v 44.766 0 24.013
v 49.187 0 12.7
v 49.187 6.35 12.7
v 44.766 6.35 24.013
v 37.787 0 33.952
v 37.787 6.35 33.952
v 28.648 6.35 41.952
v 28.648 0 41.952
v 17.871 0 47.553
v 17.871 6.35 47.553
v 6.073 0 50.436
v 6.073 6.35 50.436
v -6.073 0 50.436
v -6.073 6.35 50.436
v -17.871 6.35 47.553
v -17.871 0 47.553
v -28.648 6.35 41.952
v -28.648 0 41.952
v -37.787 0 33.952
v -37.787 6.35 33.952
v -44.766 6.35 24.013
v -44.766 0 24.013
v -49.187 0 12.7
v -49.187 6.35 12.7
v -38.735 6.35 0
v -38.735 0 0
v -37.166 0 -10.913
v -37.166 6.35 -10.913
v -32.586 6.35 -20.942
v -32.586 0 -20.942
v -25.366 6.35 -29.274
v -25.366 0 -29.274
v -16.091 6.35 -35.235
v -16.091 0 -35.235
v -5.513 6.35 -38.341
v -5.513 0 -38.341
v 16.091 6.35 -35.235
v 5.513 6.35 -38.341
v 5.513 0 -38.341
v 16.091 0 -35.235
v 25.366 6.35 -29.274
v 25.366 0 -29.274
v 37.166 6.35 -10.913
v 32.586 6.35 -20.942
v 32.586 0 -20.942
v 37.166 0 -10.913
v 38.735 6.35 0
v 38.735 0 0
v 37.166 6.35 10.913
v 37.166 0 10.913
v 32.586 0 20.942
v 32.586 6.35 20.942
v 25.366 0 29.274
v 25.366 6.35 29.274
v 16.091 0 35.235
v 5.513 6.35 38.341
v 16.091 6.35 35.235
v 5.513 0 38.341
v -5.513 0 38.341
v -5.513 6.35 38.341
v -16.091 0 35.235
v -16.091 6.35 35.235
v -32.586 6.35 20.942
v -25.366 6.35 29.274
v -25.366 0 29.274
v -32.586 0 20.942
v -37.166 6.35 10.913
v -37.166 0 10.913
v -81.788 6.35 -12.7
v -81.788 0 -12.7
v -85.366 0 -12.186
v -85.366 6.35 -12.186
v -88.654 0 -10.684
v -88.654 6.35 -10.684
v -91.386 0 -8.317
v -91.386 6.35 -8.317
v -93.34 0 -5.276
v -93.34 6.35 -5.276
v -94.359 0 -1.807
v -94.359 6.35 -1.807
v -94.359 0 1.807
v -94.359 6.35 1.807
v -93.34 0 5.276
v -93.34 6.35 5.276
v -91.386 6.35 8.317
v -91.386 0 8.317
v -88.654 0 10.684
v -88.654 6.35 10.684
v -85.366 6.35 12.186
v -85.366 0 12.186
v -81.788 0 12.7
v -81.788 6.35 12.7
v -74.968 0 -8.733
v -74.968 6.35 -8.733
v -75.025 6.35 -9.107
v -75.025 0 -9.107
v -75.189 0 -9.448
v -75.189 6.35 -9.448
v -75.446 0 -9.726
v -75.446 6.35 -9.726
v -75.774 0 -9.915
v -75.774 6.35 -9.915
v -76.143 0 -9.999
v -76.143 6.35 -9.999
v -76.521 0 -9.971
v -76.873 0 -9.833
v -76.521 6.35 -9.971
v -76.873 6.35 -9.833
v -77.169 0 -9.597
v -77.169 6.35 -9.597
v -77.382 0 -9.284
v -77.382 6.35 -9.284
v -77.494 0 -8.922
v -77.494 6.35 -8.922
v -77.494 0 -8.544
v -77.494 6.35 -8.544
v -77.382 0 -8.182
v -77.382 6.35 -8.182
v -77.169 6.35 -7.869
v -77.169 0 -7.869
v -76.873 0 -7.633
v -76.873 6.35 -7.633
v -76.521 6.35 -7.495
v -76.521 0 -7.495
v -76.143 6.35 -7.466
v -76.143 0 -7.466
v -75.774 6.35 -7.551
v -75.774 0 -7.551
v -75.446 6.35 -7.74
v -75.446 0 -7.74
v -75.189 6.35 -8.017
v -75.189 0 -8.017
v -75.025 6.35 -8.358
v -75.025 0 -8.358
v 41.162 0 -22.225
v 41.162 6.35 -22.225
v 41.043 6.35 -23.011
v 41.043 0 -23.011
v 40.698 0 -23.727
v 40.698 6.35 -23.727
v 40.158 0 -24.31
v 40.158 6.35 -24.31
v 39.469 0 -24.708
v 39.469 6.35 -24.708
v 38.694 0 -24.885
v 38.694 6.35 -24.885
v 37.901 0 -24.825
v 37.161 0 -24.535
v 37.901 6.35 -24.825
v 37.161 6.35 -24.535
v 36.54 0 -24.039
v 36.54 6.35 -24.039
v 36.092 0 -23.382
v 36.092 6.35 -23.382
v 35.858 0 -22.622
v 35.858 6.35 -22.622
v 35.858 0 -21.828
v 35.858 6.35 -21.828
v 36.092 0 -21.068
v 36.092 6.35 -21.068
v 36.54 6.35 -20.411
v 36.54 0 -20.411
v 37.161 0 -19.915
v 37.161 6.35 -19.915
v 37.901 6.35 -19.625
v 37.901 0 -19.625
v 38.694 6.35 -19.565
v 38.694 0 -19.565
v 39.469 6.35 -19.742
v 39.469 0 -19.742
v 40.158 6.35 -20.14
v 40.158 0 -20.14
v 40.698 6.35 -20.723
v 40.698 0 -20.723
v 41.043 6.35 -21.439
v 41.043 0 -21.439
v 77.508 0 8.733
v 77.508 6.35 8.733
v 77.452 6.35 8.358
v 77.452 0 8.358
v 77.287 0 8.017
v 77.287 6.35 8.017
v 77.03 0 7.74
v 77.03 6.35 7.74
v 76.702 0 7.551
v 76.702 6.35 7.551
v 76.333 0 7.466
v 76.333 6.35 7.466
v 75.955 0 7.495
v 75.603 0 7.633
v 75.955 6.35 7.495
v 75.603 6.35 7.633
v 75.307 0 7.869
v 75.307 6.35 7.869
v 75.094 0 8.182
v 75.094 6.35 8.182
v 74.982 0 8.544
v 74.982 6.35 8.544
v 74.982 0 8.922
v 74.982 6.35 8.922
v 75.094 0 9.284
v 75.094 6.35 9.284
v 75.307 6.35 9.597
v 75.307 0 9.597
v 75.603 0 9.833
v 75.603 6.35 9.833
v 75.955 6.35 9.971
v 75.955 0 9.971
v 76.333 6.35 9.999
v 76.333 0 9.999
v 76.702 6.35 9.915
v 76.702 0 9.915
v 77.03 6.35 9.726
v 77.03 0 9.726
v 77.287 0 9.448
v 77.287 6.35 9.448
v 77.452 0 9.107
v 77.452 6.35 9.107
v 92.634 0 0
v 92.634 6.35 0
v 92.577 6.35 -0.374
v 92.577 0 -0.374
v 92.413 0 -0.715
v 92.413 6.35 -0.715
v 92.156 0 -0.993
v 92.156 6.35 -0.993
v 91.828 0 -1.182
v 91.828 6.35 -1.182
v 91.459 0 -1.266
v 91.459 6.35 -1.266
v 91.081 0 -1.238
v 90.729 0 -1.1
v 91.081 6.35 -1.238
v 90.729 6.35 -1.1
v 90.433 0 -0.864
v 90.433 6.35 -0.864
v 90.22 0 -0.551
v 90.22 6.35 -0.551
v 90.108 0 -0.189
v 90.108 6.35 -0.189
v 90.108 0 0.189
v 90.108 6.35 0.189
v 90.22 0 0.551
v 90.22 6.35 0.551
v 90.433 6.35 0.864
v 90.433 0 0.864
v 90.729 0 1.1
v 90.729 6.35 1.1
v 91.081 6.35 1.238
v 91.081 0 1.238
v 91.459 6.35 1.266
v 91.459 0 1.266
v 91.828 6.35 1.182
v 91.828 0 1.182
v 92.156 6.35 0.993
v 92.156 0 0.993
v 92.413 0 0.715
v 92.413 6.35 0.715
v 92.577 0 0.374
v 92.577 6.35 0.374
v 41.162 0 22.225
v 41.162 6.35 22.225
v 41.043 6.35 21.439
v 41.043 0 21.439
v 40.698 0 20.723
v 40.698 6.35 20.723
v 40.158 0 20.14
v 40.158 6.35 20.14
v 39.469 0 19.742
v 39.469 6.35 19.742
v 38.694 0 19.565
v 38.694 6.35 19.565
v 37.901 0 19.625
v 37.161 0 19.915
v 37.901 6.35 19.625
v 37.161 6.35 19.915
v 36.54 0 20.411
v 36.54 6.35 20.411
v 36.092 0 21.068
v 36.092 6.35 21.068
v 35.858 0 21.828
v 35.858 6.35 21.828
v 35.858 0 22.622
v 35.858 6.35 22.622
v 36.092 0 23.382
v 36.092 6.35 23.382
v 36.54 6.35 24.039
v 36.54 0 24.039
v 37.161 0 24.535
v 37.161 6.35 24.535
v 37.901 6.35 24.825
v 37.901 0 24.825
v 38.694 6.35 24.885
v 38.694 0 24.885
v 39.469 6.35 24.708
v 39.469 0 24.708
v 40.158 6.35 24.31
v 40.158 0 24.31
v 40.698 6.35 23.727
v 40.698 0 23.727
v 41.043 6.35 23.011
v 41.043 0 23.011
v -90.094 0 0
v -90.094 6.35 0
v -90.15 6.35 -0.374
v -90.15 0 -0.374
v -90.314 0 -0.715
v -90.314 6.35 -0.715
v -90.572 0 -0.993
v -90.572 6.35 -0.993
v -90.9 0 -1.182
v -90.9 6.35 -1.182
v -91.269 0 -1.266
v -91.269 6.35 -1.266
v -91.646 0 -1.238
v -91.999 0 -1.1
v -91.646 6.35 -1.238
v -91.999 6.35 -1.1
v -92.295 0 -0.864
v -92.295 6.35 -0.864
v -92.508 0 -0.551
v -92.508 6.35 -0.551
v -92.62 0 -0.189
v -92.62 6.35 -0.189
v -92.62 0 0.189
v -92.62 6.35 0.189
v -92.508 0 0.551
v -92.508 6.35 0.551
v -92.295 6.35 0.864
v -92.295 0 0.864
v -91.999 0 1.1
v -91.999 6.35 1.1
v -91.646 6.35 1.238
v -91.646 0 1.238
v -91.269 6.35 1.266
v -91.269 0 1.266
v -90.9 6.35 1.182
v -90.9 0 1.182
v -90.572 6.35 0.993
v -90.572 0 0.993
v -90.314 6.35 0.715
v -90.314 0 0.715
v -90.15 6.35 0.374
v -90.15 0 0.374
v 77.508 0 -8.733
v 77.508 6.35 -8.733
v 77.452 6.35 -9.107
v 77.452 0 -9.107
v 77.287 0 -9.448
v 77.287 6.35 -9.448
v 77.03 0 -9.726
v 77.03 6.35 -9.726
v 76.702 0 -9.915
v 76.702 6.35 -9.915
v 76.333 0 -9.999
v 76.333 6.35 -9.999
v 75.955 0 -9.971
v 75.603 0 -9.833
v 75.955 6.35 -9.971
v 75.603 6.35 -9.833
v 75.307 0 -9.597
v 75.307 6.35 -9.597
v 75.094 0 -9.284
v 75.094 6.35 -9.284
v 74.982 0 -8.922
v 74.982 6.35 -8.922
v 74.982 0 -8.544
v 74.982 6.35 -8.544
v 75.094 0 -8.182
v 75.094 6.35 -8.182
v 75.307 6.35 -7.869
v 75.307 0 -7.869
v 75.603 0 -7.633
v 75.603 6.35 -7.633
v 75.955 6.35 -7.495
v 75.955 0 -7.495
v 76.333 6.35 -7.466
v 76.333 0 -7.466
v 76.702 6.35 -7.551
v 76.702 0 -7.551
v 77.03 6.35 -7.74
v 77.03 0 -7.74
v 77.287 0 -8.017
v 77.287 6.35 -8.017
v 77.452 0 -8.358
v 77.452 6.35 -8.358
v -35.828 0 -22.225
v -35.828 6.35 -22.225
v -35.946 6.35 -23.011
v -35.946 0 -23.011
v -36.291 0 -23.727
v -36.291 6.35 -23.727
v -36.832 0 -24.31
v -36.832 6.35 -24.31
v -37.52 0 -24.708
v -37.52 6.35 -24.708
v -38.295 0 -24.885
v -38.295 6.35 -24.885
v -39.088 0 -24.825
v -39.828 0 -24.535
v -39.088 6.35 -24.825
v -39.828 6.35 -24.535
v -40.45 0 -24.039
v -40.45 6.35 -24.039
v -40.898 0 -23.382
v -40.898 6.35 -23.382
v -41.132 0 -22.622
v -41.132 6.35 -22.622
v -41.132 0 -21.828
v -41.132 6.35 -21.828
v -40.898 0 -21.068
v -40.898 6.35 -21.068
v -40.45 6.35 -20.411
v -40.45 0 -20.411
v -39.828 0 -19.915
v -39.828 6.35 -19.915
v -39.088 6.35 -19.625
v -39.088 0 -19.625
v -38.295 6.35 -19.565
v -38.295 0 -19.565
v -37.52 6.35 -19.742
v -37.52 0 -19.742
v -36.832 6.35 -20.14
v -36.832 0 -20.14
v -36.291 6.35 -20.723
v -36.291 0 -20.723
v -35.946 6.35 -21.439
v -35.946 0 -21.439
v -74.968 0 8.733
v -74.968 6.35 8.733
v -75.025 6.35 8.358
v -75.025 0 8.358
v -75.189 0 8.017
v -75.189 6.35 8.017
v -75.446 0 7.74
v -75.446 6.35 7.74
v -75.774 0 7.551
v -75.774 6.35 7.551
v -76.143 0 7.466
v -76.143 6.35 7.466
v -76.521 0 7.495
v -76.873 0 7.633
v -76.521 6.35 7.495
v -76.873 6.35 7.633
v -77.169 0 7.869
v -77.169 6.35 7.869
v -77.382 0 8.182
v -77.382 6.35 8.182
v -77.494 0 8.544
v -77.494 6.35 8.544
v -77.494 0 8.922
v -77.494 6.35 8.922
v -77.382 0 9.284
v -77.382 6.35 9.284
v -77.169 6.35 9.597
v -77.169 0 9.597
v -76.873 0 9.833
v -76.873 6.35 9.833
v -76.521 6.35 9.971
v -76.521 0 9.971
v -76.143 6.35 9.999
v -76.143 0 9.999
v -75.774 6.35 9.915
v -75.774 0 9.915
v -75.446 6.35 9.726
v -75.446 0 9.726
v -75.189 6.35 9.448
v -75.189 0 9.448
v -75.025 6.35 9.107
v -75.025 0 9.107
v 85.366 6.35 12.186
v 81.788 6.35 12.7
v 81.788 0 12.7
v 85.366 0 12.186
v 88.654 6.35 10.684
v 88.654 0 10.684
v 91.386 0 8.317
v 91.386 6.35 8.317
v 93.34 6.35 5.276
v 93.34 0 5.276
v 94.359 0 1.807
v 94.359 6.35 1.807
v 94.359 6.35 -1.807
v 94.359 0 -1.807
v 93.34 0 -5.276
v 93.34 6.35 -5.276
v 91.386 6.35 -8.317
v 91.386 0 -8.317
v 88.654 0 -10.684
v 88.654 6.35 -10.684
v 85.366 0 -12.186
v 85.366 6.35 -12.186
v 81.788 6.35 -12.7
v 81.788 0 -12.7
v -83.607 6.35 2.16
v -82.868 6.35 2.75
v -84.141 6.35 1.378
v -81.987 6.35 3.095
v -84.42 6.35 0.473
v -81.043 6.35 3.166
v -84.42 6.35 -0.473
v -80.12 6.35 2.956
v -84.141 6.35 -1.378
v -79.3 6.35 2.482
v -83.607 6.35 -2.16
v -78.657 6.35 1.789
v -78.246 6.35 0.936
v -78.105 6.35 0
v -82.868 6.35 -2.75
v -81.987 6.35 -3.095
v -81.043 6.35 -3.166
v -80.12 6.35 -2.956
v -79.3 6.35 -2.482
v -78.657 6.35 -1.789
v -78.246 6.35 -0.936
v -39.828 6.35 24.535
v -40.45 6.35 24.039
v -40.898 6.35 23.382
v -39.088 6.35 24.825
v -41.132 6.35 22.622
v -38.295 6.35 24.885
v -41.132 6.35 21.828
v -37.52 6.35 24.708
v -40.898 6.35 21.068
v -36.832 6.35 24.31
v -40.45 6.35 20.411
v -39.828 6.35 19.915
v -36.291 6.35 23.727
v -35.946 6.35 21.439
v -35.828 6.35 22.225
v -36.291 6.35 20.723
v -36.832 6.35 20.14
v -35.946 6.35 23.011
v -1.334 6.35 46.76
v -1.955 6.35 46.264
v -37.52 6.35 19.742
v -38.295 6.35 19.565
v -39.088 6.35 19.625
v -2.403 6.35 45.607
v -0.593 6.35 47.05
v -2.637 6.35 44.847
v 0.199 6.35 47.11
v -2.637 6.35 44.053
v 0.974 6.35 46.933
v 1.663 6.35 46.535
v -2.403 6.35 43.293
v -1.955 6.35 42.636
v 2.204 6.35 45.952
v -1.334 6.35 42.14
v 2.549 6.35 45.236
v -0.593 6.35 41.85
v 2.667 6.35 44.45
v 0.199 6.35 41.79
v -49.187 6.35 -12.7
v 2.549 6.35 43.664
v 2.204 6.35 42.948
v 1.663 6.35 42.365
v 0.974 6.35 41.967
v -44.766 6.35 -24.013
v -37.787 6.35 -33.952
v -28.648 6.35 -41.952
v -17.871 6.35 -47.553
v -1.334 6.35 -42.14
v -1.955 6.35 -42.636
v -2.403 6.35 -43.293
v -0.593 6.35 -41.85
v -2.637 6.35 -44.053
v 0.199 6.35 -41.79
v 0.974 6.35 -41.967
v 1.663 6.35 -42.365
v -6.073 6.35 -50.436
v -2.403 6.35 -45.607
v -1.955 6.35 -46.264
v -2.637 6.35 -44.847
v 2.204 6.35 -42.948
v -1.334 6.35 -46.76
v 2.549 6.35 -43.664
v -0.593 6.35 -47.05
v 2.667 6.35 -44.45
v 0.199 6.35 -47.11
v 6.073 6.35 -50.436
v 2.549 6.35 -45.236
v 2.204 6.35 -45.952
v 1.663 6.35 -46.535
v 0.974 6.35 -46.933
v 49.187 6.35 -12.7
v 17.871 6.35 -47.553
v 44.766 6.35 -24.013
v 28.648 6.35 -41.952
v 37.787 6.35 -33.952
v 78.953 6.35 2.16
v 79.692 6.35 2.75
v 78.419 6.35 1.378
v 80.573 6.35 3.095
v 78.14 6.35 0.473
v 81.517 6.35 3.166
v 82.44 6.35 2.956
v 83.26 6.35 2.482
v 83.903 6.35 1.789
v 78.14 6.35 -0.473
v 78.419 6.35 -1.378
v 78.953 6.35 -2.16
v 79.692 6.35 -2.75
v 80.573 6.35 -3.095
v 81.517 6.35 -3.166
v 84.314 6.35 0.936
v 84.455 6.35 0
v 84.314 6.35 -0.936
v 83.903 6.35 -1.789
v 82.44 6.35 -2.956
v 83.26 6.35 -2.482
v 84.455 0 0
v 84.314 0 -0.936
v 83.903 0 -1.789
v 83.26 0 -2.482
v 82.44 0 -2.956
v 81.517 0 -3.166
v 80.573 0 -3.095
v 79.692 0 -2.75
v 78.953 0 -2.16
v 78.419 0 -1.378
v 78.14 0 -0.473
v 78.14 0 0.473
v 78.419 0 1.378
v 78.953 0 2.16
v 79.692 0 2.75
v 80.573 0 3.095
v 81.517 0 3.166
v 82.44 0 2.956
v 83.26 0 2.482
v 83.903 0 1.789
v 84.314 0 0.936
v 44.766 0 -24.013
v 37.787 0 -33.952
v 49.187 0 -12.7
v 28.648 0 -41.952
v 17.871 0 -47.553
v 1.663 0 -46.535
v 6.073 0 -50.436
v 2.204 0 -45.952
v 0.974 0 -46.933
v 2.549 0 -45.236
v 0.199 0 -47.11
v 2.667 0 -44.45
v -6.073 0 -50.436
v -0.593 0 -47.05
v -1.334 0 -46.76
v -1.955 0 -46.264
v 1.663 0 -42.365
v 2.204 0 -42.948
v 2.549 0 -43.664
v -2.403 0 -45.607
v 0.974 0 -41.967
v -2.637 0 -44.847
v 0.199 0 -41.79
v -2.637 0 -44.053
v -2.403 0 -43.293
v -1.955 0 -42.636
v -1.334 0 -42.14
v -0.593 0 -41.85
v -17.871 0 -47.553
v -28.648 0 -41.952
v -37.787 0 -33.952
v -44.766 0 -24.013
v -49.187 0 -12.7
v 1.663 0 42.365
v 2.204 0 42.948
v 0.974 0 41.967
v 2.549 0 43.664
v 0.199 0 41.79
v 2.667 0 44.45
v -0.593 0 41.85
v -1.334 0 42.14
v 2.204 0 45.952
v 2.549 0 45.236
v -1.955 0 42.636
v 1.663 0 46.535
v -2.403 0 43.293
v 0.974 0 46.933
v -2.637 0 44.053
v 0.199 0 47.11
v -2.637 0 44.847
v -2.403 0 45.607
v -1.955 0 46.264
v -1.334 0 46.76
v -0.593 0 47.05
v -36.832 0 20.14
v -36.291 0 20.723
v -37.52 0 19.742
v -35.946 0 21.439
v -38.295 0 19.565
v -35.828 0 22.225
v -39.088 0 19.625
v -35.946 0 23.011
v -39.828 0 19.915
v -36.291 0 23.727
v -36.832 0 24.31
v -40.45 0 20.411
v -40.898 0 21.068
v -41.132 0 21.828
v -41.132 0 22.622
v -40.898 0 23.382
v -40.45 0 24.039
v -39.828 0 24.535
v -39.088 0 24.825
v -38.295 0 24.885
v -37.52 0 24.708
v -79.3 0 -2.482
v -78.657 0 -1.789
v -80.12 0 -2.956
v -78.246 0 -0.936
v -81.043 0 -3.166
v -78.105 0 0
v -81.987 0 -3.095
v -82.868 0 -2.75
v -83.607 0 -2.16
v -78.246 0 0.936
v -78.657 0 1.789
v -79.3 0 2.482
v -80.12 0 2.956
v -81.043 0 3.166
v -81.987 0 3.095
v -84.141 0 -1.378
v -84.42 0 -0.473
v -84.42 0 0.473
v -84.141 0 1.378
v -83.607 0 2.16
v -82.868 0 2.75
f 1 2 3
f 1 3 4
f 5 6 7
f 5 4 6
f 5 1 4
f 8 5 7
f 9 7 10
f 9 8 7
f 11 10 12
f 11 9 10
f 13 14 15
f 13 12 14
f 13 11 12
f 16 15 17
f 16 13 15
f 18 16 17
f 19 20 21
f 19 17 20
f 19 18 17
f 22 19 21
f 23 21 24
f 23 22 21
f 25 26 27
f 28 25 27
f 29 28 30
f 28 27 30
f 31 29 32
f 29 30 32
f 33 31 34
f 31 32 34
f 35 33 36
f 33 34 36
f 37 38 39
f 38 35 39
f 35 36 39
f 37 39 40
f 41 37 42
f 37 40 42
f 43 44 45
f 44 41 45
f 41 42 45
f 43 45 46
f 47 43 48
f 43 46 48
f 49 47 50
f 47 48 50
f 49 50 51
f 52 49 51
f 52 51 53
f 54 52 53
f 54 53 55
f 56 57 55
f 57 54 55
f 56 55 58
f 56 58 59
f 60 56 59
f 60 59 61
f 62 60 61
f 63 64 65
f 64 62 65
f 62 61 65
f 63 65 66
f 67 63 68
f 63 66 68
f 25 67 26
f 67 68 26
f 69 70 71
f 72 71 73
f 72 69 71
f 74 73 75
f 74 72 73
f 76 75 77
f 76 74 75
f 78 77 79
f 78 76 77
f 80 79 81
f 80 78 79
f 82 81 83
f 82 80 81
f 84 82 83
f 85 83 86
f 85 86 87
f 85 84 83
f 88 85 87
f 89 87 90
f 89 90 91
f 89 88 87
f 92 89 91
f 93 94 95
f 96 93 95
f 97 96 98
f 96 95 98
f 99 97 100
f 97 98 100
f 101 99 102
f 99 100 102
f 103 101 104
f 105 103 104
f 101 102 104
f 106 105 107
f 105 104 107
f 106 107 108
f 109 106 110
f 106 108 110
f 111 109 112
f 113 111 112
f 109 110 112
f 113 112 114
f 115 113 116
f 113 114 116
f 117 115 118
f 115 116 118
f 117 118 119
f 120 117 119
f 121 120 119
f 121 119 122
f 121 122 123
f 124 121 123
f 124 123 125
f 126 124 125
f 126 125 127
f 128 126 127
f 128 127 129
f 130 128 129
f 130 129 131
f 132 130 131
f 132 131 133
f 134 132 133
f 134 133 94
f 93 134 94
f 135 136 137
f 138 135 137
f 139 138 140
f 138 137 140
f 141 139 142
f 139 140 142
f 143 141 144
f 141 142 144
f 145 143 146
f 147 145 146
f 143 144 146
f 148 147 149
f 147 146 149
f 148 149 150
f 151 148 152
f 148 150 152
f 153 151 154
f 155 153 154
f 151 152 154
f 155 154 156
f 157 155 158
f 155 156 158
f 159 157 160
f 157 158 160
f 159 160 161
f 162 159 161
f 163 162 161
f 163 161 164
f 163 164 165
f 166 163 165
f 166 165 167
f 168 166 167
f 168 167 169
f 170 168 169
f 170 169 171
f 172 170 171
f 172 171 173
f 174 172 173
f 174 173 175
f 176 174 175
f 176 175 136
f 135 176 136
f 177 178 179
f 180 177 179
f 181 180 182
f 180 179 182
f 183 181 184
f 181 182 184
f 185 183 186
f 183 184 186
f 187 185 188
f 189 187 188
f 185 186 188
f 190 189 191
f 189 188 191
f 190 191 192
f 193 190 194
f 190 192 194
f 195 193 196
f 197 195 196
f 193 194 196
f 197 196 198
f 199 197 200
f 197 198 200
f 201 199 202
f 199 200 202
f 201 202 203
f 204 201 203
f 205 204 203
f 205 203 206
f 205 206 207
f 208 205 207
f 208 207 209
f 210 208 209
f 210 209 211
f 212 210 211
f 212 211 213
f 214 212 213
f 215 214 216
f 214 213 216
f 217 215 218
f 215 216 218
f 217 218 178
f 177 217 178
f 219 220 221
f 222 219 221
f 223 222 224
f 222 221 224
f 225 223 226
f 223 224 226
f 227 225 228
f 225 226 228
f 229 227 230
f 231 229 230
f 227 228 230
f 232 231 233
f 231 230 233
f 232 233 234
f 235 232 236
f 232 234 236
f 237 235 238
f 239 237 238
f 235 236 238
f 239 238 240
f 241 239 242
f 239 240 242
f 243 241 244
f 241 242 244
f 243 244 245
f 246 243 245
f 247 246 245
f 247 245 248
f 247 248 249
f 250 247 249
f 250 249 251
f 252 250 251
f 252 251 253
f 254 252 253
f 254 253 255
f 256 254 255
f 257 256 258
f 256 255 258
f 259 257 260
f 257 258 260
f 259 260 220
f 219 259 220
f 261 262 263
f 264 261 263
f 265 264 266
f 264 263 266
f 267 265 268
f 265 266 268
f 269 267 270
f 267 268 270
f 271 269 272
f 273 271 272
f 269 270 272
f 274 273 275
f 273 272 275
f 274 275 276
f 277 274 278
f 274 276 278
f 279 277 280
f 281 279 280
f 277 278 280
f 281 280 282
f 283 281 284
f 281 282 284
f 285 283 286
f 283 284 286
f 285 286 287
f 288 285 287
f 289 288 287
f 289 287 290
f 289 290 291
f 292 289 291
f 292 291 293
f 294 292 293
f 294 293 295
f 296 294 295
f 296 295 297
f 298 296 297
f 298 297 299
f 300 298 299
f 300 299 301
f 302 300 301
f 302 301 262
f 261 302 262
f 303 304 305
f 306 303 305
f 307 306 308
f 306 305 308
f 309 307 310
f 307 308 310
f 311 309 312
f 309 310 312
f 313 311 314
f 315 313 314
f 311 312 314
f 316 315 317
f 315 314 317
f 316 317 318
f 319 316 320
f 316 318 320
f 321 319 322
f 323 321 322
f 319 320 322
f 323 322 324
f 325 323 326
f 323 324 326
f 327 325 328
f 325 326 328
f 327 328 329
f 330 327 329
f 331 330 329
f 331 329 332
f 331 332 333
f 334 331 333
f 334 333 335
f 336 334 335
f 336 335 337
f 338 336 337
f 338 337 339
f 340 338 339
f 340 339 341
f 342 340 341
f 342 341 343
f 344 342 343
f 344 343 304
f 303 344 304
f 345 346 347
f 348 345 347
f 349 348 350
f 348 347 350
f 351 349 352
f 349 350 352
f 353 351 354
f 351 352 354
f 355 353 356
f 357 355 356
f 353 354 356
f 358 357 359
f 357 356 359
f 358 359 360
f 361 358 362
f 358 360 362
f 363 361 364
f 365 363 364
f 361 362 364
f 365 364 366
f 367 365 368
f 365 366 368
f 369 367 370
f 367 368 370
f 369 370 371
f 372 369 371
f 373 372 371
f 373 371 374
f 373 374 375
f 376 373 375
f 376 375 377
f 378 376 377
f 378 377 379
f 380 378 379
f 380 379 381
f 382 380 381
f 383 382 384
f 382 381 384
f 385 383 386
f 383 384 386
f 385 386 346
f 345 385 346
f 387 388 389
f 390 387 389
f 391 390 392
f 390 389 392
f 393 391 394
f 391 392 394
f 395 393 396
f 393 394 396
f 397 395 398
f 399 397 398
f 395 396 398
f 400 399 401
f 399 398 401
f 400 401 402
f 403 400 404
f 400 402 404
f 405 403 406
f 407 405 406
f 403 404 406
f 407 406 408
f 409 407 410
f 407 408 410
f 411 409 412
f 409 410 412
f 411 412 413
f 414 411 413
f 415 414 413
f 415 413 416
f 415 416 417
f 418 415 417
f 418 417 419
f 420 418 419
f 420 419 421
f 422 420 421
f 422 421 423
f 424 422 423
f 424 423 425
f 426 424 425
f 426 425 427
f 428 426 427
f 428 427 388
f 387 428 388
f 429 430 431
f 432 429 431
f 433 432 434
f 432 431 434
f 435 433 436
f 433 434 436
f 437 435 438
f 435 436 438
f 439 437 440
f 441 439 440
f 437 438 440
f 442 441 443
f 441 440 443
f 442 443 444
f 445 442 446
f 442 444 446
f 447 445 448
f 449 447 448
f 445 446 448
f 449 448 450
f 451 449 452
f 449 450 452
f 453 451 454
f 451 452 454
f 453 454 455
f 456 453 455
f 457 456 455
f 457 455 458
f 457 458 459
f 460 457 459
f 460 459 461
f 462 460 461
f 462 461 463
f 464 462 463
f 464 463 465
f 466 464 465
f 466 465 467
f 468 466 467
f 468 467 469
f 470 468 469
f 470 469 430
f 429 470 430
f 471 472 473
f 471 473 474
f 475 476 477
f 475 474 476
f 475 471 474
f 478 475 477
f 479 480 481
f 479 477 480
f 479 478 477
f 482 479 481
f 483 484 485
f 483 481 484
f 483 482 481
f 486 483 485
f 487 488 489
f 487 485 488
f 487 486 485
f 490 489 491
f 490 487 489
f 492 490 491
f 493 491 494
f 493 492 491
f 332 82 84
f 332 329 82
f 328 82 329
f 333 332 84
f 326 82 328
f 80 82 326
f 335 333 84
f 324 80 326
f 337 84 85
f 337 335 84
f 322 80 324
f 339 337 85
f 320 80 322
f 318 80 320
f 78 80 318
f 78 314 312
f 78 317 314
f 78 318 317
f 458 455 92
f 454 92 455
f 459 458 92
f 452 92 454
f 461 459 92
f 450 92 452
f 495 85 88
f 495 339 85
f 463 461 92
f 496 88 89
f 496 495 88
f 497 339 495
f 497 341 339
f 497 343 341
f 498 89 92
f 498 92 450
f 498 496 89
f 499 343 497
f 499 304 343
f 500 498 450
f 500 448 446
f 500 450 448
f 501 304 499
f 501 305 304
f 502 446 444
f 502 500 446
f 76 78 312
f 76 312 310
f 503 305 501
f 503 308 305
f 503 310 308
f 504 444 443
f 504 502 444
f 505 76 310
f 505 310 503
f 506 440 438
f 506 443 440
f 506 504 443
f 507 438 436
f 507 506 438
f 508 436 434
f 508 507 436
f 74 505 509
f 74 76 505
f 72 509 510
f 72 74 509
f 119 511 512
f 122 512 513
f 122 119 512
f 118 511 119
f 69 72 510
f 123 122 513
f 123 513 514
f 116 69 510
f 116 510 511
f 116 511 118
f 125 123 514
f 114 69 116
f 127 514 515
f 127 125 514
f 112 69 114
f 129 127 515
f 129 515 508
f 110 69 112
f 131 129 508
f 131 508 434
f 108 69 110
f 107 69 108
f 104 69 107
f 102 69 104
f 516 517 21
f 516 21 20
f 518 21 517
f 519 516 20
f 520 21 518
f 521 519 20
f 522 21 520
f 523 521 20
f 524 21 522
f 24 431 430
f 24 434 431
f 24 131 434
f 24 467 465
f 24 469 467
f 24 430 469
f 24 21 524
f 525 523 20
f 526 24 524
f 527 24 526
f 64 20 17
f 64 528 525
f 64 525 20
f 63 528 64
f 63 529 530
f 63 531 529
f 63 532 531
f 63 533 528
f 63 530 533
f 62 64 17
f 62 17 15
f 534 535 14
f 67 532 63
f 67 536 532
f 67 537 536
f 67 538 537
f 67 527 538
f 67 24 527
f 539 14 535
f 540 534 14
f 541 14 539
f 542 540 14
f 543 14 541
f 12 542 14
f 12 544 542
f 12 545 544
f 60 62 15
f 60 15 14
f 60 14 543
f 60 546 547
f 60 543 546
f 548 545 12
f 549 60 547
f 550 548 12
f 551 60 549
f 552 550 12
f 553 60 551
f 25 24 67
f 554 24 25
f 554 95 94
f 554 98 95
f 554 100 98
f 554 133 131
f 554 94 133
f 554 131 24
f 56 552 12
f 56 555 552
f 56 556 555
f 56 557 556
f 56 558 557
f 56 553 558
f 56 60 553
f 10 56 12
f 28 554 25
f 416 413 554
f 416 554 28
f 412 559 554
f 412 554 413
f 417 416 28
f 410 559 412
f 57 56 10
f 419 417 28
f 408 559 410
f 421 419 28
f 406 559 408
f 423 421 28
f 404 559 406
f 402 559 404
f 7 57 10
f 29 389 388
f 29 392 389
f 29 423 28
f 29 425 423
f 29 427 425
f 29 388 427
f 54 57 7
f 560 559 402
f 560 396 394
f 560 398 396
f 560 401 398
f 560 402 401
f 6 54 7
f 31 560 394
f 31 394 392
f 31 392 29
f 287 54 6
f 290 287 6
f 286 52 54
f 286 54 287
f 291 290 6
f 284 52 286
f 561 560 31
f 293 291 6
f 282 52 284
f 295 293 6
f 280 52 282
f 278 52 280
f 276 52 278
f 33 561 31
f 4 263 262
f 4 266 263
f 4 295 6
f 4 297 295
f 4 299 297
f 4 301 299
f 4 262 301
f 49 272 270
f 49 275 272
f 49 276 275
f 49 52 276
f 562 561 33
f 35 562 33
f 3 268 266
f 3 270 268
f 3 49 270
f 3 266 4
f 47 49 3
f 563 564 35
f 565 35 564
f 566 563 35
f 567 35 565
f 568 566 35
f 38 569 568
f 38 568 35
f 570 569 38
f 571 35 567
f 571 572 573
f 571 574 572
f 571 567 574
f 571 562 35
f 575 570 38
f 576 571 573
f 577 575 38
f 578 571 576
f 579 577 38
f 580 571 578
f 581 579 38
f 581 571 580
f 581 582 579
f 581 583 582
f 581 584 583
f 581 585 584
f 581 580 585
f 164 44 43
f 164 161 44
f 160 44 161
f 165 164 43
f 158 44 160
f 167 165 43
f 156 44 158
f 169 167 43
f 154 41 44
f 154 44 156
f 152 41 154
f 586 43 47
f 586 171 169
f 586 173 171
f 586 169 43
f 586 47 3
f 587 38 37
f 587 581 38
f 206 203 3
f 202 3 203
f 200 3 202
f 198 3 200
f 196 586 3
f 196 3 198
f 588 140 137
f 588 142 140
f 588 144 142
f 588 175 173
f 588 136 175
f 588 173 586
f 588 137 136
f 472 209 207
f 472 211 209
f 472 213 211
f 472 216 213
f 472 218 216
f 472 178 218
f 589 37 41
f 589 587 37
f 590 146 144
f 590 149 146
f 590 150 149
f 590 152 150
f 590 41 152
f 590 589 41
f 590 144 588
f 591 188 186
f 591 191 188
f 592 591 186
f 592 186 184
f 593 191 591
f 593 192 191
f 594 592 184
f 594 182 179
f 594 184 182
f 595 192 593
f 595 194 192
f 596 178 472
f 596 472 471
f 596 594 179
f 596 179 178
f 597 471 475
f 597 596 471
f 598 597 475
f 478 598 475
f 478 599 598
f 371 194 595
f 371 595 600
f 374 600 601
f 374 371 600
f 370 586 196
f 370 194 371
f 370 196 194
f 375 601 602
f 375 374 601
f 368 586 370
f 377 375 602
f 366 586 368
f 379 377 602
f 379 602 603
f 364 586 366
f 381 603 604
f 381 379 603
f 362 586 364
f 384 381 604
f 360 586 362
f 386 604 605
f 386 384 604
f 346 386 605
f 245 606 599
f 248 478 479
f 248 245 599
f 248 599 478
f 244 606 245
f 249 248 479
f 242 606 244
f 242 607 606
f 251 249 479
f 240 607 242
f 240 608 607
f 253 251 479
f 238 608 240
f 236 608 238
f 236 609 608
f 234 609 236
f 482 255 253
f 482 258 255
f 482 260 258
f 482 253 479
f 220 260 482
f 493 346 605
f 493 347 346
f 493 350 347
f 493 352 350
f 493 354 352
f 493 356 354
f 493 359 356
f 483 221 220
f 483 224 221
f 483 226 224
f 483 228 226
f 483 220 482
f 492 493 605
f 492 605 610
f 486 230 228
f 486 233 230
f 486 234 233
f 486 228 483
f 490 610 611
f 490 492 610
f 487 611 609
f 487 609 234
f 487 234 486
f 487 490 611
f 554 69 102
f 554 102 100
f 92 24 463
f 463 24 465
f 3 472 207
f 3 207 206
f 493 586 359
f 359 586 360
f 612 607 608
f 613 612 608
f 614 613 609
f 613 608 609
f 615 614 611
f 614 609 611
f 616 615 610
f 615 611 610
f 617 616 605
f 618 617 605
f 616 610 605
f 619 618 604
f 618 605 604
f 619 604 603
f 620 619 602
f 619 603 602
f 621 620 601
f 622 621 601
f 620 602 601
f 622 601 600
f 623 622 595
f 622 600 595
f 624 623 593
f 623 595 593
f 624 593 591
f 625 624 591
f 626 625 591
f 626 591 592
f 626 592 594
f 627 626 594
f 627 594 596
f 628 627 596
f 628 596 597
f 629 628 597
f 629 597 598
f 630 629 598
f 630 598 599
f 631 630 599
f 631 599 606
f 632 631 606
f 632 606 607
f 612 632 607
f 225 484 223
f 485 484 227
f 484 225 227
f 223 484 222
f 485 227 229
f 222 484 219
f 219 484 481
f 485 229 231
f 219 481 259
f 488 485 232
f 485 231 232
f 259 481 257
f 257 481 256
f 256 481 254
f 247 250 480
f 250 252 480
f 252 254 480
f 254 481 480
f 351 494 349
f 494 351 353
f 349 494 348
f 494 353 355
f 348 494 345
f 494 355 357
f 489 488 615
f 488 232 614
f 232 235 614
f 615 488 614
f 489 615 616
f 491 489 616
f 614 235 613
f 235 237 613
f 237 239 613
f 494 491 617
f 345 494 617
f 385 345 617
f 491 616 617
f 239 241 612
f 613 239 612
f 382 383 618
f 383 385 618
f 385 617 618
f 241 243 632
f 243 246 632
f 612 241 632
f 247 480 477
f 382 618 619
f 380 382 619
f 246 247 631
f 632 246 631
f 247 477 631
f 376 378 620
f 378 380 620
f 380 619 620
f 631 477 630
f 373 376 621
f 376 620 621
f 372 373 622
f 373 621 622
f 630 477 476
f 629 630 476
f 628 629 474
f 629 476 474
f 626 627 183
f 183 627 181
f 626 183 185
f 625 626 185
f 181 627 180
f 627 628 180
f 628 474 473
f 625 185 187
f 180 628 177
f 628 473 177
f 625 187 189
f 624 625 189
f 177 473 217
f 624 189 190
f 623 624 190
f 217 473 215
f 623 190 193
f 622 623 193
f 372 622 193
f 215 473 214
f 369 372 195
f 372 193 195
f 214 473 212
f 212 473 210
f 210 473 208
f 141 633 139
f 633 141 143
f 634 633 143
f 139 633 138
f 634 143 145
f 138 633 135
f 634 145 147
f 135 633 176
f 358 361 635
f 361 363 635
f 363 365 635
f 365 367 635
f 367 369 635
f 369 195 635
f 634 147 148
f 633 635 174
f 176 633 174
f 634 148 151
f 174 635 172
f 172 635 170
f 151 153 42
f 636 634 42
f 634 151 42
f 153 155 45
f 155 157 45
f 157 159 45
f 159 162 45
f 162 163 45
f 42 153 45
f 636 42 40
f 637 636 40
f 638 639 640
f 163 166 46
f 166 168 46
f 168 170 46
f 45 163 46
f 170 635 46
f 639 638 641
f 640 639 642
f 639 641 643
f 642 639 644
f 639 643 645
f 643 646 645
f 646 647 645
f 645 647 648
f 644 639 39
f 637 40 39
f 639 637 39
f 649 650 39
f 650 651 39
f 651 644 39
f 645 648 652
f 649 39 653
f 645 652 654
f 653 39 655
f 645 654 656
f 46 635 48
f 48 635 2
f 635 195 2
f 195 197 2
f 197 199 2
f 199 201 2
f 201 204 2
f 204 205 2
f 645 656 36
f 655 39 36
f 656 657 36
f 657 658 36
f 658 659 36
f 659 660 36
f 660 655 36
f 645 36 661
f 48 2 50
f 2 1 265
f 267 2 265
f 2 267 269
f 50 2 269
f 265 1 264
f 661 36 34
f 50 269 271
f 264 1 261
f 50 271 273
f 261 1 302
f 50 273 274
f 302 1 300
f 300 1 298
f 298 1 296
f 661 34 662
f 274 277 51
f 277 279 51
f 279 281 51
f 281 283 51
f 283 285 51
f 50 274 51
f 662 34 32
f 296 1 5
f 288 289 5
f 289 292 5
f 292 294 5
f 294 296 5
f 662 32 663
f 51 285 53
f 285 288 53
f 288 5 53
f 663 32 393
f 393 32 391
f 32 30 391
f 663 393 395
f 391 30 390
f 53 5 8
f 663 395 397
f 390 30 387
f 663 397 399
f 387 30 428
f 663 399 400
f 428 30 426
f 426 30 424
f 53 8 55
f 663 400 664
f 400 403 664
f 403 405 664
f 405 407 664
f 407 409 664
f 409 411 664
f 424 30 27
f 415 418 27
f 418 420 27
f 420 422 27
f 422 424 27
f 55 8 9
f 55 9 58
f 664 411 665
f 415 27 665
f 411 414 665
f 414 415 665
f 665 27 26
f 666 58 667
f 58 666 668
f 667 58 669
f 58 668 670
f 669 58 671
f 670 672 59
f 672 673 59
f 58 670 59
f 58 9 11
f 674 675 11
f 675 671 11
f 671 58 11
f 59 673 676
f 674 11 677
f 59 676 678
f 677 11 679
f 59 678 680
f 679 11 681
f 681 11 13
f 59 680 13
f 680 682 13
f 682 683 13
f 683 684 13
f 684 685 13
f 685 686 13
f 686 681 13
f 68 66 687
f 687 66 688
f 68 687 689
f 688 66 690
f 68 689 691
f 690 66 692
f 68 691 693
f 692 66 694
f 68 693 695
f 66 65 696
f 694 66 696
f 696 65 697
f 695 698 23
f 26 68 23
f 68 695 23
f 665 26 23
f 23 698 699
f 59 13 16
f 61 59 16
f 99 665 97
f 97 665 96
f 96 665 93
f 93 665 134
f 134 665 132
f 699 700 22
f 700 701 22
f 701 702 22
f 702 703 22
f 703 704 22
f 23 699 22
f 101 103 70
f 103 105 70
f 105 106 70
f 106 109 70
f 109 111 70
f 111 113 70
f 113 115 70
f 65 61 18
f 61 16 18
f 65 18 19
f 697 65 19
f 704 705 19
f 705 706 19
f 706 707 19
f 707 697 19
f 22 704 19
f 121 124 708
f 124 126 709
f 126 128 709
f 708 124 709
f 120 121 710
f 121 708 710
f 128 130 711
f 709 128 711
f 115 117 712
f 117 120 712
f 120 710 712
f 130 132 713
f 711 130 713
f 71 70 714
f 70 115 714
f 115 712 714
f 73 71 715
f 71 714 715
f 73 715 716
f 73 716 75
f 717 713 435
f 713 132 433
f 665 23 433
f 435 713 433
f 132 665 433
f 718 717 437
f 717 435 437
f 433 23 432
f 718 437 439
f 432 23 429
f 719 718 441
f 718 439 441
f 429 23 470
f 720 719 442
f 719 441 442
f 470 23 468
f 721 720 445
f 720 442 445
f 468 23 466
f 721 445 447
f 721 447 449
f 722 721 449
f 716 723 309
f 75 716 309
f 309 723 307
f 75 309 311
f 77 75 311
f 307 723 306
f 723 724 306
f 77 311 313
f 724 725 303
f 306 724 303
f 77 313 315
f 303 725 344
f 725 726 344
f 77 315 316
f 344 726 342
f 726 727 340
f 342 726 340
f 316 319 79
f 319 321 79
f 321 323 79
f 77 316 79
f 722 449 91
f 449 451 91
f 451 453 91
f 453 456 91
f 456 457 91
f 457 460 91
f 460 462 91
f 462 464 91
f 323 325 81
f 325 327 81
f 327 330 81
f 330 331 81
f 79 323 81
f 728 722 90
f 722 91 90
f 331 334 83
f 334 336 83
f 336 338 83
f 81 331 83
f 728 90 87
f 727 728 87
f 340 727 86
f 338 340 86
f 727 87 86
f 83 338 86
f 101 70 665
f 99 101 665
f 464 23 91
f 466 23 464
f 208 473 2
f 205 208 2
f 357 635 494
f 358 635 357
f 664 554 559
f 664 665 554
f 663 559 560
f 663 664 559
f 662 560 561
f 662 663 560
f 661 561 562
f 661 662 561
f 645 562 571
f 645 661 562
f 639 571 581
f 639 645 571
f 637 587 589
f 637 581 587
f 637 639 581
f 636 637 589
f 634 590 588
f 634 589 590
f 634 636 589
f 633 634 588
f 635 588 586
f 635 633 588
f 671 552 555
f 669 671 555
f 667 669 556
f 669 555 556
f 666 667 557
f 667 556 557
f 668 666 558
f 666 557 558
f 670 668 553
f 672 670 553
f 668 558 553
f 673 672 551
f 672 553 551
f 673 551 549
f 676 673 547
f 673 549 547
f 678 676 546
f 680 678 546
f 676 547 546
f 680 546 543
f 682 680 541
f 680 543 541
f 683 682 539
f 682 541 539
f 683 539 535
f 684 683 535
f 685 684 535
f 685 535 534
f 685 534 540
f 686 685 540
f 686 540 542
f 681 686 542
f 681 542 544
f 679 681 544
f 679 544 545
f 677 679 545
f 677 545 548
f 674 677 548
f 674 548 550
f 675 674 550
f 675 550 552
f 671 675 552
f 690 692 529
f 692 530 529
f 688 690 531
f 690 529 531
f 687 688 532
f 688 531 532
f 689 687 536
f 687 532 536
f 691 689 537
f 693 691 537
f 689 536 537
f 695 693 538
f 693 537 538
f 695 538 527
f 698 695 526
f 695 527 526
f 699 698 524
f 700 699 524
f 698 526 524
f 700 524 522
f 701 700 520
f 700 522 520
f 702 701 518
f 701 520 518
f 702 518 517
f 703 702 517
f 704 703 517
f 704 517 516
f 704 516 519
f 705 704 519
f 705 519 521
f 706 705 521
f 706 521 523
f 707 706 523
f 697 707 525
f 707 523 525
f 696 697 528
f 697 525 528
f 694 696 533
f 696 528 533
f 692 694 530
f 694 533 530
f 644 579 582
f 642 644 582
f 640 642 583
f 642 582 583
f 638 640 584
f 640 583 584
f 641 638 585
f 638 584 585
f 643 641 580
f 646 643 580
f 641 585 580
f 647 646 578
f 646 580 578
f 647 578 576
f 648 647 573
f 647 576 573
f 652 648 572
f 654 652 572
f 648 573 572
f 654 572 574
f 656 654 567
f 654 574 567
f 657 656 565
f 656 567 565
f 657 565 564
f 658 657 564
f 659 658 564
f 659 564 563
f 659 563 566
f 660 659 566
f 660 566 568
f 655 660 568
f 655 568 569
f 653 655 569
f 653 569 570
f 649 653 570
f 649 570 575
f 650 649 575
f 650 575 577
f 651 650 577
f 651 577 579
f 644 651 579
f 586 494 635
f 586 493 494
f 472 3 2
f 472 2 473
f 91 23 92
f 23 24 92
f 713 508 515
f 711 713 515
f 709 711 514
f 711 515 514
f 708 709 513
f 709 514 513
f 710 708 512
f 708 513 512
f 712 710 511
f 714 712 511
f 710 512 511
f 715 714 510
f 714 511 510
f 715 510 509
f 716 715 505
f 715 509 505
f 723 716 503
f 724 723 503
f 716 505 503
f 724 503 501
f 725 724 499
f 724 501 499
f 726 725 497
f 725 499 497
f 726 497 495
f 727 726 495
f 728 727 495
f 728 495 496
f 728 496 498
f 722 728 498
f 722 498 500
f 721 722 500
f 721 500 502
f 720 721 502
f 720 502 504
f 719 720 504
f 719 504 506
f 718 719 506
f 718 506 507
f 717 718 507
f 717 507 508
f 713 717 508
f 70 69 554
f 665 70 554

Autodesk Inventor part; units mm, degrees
ref_plane "YZ Plane" through (0, 0, 0) normal (1, 0, 0) x (0, 1, 0)
ref_plane "XZ Plane" through (0, 0, 0) normal (0, 1, 0) x (-1, 0, 0)
ref_plane "XY Plane" through (0, 0, 0) normal (0, 0, 1) x (1, 0, 0)
sketch "Sketch4" plane through (0, 0, 0) normal (0, 1, 0) x (-1, 0, 0)
  circle A0 centre (0, 0) radius 38.735
  circle A1 centre (0, 0) radius 50.8
  dimension "d9" = 77.47
  dimension "d10" = 101.6
extrude "Extrusion2" add sketch "Sketch4" along normal blind 6.35
sketch "Sketch5" plane through (0, 6.35, 0) normal (0, 1, 0) x (1, 0, 0)
  circle A0 centre (0, -44.45) radius 2.667
  circle A1 centre (38.4948, -22.225) radius 2.667
  circle A2 centre (38.4948, 22.225) radius 2.667
  circle A3 centre (0, 44.45) radius 2.667
  circle A4 centre (-38.4948, 22.225) radius 2.667
  circle A5 centre (-38.4948, -22.225) radius 2.667
  point P0 (0, 0)
  dimension "d13" = 5.334
  dimension "d16" = 360
extrude "Extrusion3" cut sketch "Sketch5" against normal blind 6.35
sketch "Sketch7" plane through (0, 6.35, 0) normal (0, 1, 0) x (1, 0, 0)
  line L0 (50.8, 12.7) -> (81.788, 12.7)
  line L1 (81.788, 12.7) -> (81.788, -12.7)
  line L2 (81.788, -12.7) -> (50.8, -12.7)
  line L3 (50.8, -12.7) -> (50.8, 12.7)
  line L4 (-50.8, 12.7) -> (-81.788, 12.7)
  line L5 (-81.788, 12.7) -> (-81.788, -12.7)
  line L6 (-81.788, -12.7) -> (-50.8, -12.7)
  line L7 (-50.8, -12.7) -> (-50.8, 12.7)
  point P0 (0, 0)
  dimension "d50" = 30.988
  dimension "d51" = 25.4
  dimension "d52" = 30.988
extrude "Extrusion4" add sketch "Sketch7" against normal blind 6.35
sketch "Sketch8" plane through (0, 6.35, 0) normal (0, 1, 0) x (1, 0, 0)
  line L0 (-123.5202, 12.7) -> (-50.8, 12.7) projected
  line L1 (-60.9386, 12.7) -> (-45.3133, 12.7)
  line L2 (-45.3133, 12.7) -> (-45.3133, -12.7)
  line L3 (-45.3133, -12.7) -> (-60.9386, -12.7)
  line L4 (-60.9386, -12.7) -> (-60.9386, 12.7)
  line L5 (57.1886, 12.7) -> (43.7508, 12.7)
  line L6 (43.7508, 12.7) -> (43.7508, -12.7)
  line L7 (43.7508, -12.7) -> (57.1886, -12.7)
  line L8 (57.1886, -12.7) -> (57.1886, 12.7)
  point P0 (0, 0)
extrude "Extrusion5" add sketch "Sketch8" against normal blind 6.35
sketch "Sketch9" plane through (0, 6.35, 0) normal (0, 1, 0) x (1, 0, 0)
  line L0 (111.76, 12.7) -> (111.76, -12.7) projected
  line L1 (81.788, 12.7) -> (81.788, -12.7) projected
  circle A0 centre (81.788, 0) radius 12.7
  line L2 (-81.788, 12.7) -> (-81.788, -12.7) projected
  circle A1 centre (-81.788, 0) radius 12.7
  point P0 (0, 0)
  point P1 (-111.7602, 0)
  point P2 (-111.76, -12.7)
extrude "Extrusion6" add sketch "Sketch9" against normal blind 6.35
sketch "Sketch10" plane through (0, 6.35, 0) normal (0, 1, 0) x (1, 0, 0)
  circle A0 centre (81.28, 0) radius 3.175
  circle A1 centre (91.3638, 0) radius 1.27
  circle A2 centre (76.2381, 8.7328) radius 1.27
  circle A3 centre (76.2381, -8.7328) radius 1.27
  circle A4 centre (-81.28, 0) radius 3.175
  circle A5 centre (-91.3638, 0) radius 1.27
  circle A6 centre (-76.2381, -8.7328) radius 1.27
  circle A7 centre (-76.2381, 8.7328) radius 1.27
  point P0 (0, 0)
  dimension "d53" = 6.35
  dimension "d54" = 2.54
  dimension "d57" = 360
  dimension "d59" = 6.35
  dimension "d60" = 2.54
  dimension "d63" = 360
extrude "Extrusion7" cut sketch "Sketch10" against normal blind 6.35
properties part number "middle plate"
